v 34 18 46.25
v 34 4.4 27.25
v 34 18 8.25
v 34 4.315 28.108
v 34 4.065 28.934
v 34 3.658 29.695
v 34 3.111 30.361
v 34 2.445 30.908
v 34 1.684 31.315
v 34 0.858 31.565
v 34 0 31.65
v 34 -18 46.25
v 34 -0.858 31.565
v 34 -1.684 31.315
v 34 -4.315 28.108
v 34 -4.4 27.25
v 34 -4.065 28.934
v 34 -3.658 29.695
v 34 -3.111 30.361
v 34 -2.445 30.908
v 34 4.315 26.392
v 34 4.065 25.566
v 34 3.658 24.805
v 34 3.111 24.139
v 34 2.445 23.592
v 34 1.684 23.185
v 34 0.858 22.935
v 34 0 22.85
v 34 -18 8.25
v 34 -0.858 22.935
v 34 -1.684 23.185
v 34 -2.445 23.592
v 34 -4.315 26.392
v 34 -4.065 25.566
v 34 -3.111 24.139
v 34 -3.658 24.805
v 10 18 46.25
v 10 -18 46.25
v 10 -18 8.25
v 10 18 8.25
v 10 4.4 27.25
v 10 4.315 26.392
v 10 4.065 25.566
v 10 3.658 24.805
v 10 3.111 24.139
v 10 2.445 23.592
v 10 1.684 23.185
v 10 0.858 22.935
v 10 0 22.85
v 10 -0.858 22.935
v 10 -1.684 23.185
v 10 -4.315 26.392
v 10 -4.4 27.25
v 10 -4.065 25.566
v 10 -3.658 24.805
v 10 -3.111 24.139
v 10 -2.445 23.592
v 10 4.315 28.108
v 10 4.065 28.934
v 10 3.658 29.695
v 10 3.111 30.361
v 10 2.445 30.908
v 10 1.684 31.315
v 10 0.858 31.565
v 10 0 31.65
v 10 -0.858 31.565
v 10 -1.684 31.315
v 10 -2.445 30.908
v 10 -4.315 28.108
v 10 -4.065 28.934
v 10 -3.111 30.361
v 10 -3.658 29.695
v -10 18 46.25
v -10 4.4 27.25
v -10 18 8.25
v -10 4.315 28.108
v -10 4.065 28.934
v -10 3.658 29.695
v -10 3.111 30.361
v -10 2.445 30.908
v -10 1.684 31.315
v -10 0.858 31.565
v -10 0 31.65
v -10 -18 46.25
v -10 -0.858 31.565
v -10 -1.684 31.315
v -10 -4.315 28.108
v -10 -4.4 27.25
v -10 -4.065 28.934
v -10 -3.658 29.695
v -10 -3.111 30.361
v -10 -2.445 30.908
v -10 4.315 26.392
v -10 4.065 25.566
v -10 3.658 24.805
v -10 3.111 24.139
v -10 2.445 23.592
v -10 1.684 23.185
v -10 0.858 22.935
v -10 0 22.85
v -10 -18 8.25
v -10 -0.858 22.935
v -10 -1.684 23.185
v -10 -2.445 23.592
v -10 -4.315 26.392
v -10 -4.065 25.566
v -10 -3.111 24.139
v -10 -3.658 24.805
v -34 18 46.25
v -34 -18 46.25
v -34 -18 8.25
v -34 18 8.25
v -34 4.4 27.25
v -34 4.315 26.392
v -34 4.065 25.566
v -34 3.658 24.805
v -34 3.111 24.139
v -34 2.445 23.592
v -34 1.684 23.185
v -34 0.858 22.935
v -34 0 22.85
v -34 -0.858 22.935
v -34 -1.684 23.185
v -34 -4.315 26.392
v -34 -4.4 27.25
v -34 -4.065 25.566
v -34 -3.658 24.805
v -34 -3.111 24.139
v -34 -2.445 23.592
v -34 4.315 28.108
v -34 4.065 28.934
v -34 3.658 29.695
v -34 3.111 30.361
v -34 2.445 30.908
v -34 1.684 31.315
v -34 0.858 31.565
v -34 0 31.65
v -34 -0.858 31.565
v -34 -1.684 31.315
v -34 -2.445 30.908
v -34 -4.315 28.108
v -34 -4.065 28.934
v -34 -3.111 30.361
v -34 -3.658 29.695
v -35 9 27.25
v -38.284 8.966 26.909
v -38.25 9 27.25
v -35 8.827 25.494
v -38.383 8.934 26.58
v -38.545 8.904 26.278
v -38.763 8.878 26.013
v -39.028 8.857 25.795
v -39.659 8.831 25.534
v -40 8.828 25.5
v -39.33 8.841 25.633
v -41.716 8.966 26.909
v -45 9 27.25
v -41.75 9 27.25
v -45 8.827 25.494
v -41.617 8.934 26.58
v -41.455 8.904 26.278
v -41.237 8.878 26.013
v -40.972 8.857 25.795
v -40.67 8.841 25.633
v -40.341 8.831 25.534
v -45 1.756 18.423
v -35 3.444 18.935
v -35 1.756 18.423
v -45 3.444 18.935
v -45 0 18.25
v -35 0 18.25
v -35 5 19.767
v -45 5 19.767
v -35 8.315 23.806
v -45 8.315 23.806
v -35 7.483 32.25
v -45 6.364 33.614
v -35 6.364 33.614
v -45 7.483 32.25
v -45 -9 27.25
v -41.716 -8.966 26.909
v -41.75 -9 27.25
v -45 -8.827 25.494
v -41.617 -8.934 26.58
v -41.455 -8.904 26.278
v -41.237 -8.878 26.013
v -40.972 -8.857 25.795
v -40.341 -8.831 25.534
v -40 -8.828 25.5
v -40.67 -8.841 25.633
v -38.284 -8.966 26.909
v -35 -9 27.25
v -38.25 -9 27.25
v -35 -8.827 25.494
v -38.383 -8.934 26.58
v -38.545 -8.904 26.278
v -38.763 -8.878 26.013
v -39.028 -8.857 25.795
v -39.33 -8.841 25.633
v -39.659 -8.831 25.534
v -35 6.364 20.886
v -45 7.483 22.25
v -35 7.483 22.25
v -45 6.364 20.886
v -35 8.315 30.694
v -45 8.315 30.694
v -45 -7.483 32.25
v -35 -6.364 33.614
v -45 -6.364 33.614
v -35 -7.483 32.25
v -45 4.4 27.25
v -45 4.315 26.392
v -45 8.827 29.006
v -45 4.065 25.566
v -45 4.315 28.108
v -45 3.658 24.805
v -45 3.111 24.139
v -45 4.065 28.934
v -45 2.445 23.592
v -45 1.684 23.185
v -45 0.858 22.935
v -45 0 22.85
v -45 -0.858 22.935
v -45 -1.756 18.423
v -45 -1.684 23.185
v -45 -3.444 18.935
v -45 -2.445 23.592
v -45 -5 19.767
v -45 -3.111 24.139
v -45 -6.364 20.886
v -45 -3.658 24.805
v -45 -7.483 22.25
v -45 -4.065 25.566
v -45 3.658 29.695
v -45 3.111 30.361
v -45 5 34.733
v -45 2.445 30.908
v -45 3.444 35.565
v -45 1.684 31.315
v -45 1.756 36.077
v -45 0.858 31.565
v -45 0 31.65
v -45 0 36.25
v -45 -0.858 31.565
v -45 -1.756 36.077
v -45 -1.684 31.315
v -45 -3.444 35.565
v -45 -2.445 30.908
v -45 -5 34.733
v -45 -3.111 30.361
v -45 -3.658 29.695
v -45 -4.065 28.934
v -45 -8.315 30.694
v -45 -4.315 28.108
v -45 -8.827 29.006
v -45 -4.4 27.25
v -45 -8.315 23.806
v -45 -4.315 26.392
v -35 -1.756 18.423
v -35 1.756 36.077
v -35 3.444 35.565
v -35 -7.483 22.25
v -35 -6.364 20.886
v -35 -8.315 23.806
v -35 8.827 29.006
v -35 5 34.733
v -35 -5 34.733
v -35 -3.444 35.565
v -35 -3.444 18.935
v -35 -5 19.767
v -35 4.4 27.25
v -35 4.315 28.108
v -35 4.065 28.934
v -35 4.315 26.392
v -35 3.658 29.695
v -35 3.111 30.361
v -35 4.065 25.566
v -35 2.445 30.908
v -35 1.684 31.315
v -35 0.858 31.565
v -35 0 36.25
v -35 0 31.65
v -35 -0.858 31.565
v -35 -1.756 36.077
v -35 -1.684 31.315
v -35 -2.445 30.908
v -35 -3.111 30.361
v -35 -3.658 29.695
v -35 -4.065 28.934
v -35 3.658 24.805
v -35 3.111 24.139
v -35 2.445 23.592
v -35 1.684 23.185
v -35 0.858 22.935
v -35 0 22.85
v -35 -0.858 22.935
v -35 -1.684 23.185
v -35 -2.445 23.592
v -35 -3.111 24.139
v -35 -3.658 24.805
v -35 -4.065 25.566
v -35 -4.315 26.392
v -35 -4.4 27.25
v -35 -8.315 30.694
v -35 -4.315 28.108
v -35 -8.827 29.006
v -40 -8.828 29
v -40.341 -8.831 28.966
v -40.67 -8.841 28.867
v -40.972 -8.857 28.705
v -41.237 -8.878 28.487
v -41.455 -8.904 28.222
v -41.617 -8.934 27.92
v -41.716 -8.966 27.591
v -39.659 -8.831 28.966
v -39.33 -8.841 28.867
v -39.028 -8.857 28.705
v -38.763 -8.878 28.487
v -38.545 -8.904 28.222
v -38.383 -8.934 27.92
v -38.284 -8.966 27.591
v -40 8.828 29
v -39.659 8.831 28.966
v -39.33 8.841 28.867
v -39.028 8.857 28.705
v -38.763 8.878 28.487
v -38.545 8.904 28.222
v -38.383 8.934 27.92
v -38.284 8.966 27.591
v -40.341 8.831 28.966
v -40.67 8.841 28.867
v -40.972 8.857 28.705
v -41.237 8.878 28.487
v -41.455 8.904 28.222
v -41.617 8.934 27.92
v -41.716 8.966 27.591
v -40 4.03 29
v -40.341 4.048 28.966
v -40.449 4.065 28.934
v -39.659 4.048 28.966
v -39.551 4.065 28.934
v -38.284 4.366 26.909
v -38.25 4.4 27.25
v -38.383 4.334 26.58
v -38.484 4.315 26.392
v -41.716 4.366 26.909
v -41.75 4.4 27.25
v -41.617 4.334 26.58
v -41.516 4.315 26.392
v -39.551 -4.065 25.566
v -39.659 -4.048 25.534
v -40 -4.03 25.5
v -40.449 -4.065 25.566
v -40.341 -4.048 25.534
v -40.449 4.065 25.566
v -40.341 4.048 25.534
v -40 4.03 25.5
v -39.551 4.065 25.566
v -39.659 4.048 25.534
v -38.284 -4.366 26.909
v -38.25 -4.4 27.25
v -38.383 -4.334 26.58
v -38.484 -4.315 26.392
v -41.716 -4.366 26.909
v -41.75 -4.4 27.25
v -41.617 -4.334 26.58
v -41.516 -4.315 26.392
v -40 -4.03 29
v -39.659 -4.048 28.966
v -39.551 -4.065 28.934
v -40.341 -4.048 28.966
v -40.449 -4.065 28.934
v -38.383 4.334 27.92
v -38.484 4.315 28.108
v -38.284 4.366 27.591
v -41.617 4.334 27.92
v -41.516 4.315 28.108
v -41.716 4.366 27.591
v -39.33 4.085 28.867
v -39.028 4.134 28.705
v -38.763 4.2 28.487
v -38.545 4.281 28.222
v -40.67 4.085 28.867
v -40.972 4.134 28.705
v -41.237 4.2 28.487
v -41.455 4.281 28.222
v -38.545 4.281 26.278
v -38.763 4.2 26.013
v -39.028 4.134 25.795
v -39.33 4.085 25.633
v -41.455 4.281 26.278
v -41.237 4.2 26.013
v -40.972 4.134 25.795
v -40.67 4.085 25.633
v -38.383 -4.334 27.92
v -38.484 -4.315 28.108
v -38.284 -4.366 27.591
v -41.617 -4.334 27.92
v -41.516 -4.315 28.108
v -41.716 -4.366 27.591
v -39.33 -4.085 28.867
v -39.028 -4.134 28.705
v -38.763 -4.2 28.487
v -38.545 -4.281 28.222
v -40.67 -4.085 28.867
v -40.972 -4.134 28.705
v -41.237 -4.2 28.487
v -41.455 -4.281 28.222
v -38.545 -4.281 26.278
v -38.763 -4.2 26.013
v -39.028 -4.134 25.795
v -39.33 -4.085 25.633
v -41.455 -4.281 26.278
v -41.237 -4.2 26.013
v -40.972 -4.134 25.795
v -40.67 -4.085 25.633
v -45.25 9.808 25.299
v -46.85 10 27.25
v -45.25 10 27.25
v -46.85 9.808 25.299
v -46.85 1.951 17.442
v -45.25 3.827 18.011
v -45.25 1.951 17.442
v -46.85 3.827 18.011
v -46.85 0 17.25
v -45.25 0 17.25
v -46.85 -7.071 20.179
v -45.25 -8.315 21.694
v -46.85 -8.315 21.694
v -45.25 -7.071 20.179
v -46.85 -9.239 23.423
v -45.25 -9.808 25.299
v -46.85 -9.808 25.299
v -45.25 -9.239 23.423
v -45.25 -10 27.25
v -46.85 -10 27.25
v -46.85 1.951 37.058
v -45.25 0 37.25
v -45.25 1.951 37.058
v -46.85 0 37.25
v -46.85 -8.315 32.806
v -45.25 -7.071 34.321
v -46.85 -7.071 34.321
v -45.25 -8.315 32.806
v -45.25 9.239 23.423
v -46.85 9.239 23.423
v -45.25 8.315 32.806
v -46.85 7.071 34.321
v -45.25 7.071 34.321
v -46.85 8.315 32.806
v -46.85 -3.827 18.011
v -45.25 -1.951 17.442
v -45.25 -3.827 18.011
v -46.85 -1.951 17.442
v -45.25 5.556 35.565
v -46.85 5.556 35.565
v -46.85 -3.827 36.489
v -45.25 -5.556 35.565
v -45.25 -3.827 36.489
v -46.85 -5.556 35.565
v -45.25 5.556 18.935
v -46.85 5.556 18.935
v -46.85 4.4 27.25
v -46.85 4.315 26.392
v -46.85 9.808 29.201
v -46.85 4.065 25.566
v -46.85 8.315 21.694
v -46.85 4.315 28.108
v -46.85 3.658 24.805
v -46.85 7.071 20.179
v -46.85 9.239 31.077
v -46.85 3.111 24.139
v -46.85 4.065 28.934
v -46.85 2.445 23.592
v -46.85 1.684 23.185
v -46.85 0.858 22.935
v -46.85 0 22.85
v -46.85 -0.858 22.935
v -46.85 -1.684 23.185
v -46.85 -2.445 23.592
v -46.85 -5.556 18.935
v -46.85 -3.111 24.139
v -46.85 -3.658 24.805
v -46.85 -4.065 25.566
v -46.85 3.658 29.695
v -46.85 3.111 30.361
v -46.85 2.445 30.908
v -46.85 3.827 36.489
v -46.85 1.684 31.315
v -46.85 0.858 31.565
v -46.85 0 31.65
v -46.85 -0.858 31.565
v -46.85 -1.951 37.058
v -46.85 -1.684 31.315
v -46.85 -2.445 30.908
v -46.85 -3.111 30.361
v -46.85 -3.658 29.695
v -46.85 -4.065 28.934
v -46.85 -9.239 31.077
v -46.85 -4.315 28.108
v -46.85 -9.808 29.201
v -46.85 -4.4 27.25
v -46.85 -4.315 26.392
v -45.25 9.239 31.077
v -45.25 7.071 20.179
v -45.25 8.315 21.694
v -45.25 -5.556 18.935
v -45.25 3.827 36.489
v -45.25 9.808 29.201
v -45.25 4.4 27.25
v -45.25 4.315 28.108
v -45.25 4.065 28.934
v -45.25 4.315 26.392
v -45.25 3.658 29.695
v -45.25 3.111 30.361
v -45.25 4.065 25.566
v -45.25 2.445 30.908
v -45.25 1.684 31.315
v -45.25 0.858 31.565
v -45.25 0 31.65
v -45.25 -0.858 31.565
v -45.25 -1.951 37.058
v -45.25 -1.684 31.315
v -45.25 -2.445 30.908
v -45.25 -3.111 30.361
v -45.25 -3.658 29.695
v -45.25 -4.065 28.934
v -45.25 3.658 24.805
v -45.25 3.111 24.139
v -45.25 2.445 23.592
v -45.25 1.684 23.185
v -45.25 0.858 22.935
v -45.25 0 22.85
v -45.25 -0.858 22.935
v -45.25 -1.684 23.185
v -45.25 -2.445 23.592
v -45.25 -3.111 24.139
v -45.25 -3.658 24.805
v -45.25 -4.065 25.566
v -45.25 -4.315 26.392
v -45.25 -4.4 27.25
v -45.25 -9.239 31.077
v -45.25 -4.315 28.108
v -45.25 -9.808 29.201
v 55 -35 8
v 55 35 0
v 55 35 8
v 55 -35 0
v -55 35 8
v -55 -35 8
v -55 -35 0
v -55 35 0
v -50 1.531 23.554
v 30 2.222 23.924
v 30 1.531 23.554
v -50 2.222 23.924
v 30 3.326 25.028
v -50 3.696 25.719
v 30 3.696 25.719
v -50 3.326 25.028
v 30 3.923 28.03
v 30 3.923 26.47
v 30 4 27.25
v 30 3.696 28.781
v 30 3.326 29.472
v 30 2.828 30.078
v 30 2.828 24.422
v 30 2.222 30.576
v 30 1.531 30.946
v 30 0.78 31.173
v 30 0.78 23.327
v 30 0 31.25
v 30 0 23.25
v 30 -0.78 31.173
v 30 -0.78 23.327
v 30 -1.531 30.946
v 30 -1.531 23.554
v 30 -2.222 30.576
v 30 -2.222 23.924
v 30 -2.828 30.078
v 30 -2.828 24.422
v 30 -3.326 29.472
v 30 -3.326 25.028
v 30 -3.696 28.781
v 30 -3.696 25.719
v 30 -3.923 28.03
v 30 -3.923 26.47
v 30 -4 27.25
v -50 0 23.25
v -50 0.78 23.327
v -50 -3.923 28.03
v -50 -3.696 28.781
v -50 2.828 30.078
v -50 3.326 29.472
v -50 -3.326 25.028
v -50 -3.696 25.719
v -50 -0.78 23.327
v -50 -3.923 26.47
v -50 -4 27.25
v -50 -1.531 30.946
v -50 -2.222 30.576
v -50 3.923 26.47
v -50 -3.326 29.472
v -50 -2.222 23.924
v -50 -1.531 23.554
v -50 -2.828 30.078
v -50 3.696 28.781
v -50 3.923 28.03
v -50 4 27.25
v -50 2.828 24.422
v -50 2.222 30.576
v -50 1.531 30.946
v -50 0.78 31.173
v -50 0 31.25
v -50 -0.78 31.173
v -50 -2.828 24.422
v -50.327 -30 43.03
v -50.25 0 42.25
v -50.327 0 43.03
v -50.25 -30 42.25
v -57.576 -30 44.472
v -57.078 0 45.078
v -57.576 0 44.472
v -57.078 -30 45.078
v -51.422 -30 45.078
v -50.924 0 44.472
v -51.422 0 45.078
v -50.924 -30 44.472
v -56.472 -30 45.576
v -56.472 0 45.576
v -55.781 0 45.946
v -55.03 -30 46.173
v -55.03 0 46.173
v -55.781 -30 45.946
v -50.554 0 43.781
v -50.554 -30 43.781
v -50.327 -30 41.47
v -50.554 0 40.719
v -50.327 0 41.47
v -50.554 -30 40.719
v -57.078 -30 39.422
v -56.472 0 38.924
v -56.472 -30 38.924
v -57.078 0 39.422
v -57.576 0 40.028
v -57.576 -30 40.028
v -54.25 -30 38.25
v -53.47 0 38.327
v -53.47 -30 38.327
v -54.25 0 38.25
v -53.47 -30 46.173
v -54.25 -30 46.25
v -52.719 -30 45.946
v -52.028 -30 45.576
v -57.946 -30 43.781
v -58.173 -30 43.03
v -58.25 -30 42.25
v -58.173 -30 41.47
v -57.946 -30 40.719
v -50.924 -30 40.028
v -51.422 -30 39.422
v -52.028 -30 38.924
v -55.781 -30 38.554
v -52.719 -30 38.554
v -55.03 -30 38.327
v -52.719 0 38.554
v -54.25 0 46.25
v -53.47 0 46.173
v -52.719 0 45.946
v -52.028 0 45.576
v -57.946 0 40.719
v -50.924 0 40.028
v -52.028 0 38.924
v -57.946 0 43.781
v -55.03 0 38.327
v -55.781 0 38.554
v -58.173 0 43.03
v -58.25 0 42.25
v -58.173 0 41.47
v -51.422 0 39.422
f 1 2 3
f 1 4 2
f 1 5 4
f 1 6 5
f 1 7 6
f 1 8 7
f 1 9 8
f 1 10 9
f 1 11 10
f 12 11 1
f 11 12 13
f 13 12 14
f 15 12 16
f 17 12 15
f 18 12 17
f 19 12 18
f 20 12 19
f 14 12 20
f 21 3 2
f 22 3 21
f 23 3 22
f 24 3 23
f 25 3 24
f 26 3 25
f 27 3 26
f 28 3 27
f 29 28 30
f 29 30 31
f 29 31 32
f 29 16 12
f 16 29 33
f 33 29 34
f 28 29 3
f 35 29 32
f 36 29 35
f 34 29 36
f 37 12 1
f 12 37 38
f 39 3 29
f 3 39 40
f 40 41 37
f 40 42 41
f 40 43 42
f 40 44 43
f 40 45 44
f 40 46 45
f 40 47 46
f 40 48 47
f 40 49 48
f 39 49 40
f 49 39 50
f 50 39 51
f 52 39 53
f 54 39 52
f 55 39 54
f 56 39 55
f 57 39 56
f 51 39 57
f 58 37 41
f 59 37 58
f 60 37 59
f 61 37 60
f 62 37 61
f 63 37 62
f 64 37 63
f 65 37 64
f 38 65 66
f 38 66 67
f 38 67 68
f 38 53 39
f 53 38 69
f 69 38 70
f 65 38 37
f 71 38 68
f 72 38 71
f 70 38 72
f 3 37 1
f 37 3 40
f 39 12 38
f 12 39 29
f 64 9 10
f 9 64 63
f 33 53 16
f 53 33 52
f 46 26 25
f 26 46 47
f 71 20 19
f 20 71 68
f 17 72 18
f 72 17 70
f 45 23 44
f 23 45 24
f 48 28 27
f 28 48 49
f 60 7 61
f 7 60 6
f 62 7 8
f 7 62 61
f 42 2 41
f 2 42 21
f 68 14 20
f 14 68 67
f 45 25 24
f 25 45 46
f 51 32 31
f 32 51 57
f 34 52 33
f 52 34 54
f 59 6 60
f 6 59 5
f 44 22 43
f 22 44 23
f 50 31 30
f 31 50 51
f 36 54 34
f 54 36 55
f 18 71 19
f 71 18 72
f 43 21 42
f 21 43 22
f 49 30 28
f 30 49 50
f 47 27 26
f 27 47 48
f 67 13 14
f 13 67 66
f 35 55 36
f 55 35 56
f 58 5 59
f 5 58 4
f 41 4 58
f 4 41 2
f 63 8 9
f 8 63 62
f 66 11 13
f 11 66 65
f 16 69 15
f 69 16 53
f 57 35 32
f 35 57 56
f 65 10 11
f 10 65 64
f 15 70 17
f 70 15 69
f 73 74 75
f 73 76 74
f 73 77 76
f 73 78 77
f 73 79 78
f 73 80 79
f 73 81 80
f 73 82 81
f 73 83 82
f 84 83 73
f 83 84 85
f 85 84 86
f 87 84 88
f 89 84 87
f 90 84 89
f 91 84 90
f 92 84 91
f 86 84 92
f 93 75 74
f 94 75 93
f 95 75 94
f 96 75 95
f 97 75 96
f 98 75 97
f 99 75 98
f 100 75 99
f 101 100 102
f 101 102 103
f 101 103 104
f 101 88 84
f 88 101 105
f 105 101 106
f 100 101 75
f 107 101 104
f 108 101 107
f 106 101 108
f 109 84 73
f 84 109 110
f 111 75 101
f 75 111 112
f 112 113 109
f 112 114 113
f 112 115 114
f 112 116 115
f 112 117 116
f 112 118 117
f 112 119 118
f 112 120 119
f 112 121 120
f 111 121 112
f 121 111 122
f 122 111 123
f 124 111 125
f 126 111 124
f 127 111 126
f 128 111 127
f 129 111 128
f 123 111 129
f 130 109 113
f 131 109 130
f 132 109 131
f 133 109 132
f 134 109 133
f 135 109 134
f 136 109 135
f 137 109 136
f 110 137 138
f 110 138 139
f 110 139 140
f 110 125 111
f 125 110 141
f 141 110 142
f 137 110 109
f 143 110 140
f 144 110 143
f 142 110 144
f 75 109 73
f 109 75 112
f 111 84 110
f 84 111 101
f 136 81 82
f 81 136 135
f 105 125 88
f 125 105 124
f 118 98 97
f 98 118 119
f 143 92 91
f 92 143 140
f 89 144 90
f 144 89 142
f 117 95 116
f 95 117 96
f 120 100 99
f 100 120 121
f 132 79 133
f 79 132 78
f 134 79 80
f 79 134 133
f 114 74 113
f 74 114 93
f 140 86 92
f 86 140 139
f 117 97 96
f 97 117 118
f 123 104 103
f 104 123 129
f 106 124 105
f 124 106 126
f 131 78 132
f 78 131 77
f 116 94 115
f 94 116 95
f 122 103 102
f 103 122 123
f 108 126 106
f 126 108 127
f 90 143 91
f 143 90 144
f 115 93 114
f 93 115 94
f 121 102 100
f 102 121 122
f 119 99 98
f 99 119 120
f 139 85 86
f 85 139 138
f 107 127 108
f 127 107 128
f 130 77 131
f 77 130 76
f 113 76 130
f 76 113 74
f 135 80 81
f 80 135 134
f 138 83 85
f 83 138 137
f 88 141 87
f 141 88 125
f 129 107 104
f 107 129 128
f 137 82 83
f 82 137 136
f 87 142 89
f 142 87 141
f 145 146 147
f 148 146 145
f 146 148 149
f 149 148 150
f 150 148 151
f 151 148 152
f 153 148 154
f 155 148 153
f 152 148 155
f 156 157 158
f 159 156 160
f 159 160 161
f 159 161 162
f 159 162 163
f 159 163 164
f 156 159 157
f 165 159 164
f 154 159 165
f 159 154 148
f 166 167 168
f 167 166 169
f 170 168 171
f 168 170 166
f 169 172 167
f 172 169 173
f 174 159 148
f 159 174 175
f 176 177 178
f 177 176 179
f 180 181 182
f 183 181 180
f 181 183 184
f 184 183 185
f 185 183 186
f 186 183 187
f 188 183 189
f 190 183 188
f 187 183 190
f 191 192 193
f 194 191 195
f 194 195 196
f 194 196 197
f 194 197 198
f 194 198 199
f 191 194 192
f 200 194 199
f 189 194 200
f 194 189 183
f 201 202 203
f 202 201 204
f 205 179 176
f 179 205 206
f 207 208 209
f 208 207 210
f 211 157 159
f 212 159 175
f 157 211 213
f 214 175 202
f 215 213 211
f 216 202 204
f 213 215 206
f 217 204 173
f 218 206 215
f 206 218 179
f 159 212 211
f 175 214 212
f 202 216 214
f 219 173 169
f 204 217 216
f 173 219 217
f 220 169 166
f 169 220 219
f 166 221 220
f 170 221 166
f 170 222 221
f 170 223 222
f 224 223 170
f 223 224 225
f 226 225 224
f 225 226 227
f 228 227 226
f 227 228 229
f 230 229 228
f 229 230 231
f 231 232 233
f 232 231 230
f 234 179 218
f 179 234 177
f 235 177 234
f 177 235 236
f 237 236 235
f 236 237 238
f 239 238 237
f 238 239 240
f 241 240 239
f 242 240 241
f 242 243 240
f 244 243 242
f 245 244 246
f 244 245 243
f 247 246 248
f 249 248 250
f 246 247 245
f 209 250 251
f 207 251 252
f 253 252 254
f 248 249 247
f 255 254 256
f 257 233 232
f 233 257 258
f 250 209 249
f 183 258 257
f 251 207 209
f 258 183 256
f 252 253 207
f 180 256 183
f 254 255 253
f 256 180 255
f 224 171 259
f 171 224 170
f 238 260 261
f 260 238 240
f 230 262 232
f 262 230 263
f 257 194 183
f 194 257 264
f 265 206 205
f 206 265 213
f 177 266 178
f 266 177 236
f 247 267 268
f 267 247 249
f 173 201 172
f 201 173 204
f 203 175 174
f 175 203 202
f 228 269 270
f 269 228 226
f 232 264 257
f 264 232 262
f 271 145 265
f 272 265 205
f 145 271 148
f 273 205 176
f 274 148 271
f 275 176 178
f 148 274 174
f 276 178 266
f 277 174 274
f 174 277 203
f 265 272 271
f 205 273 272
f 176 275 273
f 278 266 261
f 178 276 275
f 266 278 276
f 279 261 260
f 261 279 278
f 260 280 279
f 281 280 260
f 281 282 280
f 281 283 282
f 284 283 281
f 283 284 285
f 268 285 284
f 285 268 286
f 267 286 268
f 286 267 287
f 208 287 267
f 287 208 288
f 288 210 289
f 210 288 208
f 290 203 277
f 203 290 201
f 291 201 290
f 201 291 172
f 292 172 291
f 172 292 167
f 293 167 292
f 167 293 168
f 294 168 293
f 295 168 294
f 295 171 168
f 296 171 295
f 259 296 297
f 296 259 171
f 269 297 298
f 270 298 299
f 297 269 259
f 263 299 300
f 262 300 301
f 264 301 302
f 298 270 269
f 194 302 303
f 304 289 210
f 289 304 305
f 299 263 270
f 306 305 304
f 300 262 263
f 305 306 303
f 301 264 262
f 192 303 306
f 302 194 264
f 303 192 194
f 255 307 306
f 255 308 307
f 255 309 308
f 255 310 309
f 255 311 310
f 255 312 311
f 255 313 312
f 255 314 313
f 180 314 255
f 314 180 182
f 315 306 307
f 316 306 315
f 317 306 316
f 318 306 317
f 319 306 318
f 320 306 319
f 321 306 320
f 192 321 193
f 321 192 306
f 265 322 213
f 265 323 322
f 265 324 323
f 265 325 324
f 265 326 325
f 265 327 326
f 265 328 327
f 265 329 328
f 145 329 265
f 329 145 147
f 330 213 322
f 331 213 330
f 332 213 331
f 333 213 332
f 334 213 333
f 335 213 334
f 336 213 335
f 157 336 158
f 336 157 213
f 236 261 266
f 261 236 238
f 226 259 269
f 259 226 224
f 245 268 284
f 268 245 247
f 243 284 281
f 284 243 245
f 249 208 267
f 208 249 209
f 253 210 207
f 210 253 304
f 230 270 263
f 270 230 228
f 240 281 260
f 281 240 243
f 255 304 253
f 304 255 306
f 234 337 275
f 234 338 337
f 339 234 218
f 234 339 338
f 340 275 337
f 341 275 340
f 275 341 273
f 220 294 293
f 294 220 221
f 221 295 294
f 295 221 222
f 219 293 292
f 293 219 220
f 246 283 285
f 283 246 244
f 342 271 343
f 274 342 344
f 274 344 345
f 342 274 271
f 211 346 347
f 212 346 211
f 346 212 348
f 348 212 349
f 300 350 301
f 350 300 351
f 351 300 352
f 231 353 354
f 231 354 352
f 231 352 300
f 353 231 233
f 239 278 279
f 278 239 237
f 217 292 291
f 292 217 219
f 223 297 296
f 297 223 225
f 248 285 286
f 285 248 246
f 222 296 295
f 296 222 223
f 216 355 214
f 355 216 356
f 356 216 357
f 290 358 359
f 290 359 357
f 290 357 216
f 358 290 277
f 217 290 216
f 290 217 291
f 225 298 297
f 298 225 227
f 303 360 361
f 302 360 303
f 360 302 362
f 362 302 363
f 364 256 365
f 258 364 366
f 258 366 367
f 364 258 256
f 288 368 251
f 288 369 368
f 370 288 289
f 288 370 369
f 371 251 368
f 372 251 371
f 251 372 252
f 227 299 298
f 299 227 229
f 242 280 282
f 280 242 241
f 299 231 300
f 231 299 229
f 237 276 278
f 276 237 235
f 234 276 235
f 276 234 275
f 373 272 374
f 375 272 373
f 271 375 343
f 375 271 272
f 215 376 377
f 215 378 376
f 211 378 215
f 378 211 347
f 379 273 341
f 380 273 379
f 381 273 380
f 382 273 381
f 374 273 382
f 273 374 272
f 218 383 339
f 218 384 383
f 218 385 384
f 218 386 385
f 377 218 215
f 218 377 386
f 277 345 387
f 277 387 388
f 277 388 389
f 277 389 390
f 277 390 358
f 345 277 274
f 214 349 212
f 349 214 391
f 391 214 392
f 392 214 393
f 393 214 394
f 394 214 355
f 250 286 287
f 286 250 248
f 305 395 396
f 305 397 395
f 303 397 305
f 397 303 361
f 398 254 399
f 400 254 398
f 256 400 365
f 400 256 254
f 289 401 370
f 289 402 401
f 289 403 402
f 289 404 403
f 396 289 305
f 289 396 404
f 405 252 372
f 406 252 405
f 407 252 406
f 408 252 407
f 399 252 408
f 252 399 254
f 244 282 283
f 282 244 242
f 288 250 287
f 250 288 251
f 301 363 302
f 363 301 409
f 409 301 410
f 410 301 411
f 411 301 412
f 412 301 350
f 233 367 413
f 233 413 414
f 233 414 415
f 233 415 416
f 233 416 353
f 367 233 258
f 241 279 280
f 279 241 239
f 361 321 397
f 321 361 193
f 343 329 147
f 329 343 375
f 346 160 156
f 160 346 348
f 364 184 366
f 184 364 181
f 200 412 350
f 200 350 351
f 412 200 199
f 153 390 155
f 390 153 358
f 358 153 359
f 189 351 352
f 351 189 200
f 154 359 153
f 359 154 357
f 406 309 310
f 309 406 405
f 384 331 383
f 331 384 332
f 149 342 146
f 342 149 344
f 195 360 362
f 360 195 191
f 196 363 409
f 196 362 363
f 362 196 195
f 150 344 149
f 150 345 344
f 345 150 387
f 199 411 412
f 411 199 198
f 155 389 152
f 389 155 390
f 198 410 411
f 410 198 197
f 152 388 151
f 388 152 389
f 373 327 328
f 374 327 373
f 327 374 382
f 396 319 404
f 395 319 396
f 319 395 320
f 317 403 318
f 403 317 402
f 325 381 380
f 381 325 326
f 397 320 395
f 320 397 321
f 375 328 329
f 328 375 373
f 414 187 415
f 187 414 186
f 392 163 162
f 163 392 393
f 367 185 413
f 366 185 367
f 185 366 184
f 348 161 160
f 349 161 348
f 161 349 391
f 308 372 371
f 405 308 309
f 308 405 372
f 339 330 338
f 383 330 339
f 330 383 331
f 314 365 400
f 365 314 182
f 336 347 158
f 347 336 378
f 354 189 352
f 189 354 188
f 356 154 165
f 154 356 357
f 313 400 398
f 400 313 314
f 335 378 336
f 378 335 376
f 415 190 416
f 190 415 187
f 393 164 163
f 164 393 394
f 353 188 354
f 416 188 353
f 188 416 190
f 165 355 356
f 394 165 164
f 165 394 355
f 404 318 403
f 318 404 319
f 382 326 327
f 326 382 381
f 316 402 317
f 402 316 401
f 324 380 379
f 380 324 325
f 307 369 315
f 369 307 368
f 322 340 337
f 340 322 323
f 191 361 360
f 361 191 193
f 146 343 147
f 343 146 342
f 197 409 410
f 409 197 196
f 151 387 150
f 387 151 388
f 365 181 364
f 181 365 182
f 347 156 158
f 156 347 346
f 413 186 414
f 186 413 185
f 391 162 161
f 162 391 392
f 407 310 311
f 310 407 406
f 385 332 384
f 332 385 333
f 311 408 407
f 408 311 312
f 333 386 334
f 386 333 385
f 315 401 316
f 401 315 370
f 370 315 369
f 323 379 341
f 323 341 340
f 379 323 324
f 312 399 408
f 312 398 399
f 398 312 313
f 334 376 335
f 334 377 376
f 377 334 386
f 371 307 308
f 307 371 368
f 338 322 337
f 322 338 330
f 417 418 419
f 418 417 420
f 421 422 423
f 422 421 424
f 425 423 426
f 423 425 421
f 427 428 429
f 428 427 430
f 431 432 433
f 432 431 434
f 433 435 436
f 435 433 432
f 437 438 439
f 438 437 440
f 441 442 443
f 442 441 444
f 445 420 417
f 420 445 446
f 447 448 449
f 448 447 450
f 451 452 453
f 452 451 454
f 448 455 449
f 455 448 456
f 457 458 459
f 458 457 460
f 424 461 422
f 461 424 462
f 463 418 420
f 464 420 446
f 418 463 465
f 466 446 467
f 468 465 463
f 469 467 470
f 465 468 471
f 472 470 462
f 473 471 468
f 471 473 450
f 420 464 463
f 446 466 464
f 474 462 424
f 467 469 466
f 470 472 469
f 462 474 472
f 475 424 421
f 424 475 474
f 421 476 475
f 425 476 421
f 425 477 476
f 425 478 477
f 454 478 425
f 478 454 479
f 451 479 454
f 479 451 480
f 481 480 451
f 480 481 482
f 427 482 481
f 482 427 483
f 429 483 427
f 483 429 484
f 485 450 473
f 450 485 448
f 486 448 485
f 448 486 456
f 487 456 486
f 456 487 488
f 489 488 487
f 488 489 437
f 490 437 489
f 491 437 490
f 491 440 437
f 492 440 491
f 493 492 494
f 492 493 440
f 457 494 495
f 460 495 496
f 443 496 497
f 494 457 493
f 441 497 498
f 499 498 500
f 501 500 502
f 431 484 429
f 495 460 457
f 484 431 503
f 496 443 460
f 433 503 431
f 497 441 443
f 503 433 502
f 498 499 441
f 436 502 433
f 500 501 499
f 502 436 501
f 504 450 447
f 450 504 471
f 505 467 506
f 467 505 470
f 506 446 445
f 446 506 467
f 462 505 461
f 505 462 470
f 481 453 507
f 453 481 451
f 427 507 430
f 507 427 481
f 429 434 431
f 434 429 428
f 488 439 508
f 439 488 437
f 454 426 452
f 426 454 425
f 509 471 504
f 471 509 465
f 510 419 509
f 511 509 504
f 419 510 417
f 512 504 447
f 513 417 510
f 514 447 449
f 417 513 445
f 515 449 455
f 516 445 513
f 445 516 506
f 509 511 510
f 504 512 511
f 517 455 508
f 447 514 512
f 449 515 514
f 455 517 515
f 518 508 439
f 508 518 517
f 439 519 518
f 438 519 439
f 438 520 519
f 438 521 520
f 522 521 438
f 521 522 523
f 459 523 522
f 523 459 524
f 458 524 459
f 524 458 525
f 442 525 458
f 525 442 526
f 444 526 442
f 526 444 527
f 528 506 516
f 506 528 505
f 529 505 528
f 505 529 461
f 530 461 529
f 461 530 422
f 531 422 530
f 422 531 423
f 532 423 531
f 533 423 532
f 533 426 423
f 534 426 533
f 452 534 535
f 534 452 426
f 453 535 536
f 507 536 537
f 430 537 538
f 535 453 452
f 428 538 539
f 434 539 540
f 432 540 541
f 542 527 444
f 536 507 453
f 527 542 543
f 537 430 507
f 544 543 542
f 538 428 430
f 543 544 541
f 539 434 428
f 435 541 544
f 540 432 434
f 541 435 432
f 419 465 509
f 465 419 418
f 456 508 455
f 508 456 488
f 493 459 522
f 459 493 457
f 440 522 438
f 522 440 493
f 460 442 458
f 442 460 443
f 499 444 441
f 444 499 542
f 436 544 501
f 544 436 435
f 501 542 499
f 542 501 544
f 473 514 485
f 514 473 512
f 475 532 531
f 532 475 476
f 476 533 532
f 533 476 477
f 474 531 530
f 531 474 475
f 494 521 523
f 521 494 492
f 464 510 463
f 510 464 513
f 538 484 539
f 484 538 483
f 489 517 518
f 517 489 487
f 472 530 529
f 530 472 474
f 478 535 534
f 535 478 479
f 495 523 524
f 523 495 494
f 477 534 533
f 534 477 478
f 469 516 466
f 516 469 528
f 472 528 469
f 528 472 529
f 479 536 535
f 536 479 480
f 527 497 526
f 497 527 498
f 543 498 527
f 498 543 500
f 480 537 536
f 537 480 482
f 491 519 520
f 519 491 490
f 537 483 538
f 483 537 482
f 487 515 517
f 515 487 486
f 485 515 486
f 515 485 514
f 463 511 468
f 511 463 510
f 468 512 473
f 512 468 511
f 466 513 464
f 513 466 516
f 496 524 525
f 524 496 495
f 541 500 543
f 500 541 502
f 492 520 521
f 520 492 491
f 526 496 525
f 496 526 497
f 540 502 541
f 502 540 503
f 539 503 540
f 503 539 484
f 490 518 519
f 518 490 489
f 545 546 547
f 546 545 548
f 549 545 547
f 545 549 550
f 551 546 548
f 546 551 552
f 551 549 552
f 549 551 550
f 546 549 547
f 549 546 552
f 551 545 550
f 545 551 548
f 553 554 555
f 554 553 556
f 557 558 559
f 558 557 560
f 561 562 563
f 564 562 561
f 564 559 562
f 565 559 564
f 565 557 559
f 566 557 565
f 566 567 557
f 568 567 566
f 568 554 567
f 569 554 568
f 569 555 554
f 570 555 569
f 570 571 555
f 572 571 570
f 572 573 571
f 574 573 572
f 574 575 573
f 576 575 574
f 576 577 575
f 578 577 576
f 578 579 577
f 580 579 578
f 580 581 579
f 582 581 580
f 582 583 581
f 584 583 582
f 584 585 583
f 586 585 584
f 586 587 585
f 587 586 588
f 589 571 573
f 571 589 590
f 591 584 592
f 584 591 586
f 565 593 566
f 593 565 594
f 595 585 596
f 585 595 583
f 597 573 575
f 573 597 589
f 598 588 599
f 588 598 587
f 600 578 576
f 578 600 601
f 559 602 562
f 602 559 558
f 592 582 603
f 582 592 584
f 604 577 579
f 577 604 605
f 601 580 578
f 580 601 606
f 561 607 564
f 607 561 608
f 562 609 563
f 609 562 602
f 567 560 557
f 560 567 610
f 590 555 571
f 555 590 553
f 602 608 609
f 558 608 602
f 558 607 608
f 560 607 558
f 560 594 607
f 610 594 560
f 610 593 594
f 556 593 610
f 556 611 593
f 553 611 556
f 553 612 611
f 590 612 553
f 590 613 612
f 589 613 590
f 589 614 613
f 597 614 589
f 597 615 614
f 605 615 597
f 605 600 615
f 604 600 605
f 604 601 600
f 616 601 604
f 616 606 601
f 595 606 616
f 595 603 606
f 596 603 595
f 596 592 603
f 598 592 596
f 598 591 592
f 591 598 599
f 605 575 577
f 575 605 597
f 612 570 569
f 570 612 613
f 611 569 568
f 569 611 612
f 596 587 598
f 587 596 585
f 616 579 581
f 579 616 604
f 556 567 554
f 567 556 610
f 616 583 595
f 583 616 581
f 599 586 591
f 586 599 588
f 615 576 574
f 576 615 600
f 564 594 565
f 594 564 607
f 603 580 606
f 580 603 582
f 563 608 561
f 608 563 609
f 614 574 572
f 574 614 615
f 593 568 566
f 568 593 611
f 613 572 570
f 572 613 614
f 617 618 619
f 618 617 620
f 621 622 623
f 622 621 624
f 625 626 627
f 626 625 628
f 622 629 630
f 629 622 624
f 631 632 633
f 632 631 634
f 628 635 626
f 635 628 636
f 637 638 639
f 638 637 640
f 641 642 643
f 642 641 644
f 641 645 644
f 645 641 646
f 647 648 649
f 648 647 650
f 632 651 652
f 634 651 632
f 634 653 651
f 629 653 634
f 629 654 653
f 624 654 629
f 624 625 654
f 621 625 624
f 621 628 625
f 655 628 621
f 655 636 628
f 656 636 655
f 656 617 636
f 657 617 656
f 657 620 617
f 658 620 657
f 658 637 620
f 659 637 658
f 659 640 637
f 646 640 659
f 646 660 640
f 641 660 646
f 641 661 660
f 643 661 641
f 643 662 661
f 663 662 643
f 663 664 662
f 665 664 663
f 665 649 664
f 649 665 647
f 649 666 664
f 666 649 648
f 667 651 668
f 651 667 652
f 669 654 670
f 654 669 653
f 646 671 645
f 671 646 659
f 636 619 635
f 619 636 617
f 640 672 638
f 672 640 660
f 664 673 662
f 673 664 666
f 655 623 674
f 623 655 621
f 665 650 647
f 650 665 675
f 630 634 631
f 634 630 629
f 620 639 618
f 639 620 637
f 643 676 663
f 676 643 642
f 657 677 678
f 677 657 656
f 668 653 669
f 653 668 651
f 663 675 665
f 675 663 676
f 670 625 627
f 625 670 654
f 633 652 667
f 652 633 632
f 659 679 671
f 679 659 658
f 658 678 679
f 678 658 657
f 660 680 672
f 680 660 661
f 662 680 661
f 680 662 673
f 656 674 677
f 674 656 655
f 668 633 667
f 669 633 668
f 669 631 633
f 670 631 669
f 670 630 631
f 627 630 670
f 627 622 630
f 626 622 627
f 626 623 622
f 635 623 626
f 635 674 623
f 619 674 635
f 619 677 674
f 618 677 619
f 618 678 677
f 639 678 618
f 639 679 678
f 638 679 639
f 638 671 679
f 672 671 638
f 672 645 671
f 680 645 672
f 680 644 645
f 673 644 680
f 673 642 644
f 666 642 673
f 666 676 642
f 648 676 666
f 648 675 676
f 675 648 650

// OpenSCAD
$fn = 32;

// ------------------------------------------------------------------------
// Machine vise: screw d8, jaws 24 x 38 mm
// Every part is its own module, assembly() places every instance.
// ------------------------------------------------------------------------

// --- part 1 ---
module vise_bed() {
  difference() {
    translate([-55, -35, 0]) cube([110, 70, 8]);
  }
}

// --- part 2 ---
module vise_jaw() {
  difference() {
    translate([-12, -18, 0]) cube([24, 36, 38]);
    translate([0, 0, 19]) rotate([0, 90, 0]) cylinder(h = 26, d = 8.8, center = true);
  }
}

// --- part 3 ---
module vise_screw() {
  translate([0, 0, -40]) cylinder(h = 80, d = 8);
}

// --- part 4 ---
module screw_collar() {
  difference() {
    cylinder(h = 10, d = 18);
    translate([0, 0, -1]) cylinder(h = 12, d = 8.8);
    translate([0, 0, 5]) rotate([90, 0, 0]) cylinder(h = 20, d = 3.5, center = true);
  }
}

// --- part 5 ---
module screw_washer() {
  difference() {
      translate([0, 0, 0]) cylinder(h = 1.6, d = 20);
      translate([0, 0, -1]) cylinder(h = 3.6, d = 8.8);
    }
}

// --- part 6 ---
module vise_handle() {
  cylinder(h = 30, d = 8);
}

// --- assembly ---
module assembly() {
  color([0.80, 0.24, 0.20]) translate([0, 0, 0]) rotate([0, 0, 0]) vise_bed();
  color([0.20, 0.45, 0.75]) translate([22, 0, 8.25]) rotate([0, 0, 0]) vise_jaw();
  color([0.25, 0.62, 0.32]) translate([-22, 0, 8.25]) rotate([0, 0, 0]) vise_jaw();
  color([0.92, 0.70, 0.18]) translate([-10, 0, 27.25]) rotate([0, 90, 0]) vise_screw();
  color([0.58, 0.35, 0.70]) translate([-45, 0, 27.25]) rotate([0, 90, 0]) screw_collar();
  color([0.16, 0.66, 0.66]) translate([-46.85, 0, 27.25]) rotate([0, 90, 0]) screw_washer();
  color([0.85, 0.48, 0.18]) translate([-54.25, 0, 42.25]) rotate([90, 0, 0]) vise_handle();
}

assembly();
